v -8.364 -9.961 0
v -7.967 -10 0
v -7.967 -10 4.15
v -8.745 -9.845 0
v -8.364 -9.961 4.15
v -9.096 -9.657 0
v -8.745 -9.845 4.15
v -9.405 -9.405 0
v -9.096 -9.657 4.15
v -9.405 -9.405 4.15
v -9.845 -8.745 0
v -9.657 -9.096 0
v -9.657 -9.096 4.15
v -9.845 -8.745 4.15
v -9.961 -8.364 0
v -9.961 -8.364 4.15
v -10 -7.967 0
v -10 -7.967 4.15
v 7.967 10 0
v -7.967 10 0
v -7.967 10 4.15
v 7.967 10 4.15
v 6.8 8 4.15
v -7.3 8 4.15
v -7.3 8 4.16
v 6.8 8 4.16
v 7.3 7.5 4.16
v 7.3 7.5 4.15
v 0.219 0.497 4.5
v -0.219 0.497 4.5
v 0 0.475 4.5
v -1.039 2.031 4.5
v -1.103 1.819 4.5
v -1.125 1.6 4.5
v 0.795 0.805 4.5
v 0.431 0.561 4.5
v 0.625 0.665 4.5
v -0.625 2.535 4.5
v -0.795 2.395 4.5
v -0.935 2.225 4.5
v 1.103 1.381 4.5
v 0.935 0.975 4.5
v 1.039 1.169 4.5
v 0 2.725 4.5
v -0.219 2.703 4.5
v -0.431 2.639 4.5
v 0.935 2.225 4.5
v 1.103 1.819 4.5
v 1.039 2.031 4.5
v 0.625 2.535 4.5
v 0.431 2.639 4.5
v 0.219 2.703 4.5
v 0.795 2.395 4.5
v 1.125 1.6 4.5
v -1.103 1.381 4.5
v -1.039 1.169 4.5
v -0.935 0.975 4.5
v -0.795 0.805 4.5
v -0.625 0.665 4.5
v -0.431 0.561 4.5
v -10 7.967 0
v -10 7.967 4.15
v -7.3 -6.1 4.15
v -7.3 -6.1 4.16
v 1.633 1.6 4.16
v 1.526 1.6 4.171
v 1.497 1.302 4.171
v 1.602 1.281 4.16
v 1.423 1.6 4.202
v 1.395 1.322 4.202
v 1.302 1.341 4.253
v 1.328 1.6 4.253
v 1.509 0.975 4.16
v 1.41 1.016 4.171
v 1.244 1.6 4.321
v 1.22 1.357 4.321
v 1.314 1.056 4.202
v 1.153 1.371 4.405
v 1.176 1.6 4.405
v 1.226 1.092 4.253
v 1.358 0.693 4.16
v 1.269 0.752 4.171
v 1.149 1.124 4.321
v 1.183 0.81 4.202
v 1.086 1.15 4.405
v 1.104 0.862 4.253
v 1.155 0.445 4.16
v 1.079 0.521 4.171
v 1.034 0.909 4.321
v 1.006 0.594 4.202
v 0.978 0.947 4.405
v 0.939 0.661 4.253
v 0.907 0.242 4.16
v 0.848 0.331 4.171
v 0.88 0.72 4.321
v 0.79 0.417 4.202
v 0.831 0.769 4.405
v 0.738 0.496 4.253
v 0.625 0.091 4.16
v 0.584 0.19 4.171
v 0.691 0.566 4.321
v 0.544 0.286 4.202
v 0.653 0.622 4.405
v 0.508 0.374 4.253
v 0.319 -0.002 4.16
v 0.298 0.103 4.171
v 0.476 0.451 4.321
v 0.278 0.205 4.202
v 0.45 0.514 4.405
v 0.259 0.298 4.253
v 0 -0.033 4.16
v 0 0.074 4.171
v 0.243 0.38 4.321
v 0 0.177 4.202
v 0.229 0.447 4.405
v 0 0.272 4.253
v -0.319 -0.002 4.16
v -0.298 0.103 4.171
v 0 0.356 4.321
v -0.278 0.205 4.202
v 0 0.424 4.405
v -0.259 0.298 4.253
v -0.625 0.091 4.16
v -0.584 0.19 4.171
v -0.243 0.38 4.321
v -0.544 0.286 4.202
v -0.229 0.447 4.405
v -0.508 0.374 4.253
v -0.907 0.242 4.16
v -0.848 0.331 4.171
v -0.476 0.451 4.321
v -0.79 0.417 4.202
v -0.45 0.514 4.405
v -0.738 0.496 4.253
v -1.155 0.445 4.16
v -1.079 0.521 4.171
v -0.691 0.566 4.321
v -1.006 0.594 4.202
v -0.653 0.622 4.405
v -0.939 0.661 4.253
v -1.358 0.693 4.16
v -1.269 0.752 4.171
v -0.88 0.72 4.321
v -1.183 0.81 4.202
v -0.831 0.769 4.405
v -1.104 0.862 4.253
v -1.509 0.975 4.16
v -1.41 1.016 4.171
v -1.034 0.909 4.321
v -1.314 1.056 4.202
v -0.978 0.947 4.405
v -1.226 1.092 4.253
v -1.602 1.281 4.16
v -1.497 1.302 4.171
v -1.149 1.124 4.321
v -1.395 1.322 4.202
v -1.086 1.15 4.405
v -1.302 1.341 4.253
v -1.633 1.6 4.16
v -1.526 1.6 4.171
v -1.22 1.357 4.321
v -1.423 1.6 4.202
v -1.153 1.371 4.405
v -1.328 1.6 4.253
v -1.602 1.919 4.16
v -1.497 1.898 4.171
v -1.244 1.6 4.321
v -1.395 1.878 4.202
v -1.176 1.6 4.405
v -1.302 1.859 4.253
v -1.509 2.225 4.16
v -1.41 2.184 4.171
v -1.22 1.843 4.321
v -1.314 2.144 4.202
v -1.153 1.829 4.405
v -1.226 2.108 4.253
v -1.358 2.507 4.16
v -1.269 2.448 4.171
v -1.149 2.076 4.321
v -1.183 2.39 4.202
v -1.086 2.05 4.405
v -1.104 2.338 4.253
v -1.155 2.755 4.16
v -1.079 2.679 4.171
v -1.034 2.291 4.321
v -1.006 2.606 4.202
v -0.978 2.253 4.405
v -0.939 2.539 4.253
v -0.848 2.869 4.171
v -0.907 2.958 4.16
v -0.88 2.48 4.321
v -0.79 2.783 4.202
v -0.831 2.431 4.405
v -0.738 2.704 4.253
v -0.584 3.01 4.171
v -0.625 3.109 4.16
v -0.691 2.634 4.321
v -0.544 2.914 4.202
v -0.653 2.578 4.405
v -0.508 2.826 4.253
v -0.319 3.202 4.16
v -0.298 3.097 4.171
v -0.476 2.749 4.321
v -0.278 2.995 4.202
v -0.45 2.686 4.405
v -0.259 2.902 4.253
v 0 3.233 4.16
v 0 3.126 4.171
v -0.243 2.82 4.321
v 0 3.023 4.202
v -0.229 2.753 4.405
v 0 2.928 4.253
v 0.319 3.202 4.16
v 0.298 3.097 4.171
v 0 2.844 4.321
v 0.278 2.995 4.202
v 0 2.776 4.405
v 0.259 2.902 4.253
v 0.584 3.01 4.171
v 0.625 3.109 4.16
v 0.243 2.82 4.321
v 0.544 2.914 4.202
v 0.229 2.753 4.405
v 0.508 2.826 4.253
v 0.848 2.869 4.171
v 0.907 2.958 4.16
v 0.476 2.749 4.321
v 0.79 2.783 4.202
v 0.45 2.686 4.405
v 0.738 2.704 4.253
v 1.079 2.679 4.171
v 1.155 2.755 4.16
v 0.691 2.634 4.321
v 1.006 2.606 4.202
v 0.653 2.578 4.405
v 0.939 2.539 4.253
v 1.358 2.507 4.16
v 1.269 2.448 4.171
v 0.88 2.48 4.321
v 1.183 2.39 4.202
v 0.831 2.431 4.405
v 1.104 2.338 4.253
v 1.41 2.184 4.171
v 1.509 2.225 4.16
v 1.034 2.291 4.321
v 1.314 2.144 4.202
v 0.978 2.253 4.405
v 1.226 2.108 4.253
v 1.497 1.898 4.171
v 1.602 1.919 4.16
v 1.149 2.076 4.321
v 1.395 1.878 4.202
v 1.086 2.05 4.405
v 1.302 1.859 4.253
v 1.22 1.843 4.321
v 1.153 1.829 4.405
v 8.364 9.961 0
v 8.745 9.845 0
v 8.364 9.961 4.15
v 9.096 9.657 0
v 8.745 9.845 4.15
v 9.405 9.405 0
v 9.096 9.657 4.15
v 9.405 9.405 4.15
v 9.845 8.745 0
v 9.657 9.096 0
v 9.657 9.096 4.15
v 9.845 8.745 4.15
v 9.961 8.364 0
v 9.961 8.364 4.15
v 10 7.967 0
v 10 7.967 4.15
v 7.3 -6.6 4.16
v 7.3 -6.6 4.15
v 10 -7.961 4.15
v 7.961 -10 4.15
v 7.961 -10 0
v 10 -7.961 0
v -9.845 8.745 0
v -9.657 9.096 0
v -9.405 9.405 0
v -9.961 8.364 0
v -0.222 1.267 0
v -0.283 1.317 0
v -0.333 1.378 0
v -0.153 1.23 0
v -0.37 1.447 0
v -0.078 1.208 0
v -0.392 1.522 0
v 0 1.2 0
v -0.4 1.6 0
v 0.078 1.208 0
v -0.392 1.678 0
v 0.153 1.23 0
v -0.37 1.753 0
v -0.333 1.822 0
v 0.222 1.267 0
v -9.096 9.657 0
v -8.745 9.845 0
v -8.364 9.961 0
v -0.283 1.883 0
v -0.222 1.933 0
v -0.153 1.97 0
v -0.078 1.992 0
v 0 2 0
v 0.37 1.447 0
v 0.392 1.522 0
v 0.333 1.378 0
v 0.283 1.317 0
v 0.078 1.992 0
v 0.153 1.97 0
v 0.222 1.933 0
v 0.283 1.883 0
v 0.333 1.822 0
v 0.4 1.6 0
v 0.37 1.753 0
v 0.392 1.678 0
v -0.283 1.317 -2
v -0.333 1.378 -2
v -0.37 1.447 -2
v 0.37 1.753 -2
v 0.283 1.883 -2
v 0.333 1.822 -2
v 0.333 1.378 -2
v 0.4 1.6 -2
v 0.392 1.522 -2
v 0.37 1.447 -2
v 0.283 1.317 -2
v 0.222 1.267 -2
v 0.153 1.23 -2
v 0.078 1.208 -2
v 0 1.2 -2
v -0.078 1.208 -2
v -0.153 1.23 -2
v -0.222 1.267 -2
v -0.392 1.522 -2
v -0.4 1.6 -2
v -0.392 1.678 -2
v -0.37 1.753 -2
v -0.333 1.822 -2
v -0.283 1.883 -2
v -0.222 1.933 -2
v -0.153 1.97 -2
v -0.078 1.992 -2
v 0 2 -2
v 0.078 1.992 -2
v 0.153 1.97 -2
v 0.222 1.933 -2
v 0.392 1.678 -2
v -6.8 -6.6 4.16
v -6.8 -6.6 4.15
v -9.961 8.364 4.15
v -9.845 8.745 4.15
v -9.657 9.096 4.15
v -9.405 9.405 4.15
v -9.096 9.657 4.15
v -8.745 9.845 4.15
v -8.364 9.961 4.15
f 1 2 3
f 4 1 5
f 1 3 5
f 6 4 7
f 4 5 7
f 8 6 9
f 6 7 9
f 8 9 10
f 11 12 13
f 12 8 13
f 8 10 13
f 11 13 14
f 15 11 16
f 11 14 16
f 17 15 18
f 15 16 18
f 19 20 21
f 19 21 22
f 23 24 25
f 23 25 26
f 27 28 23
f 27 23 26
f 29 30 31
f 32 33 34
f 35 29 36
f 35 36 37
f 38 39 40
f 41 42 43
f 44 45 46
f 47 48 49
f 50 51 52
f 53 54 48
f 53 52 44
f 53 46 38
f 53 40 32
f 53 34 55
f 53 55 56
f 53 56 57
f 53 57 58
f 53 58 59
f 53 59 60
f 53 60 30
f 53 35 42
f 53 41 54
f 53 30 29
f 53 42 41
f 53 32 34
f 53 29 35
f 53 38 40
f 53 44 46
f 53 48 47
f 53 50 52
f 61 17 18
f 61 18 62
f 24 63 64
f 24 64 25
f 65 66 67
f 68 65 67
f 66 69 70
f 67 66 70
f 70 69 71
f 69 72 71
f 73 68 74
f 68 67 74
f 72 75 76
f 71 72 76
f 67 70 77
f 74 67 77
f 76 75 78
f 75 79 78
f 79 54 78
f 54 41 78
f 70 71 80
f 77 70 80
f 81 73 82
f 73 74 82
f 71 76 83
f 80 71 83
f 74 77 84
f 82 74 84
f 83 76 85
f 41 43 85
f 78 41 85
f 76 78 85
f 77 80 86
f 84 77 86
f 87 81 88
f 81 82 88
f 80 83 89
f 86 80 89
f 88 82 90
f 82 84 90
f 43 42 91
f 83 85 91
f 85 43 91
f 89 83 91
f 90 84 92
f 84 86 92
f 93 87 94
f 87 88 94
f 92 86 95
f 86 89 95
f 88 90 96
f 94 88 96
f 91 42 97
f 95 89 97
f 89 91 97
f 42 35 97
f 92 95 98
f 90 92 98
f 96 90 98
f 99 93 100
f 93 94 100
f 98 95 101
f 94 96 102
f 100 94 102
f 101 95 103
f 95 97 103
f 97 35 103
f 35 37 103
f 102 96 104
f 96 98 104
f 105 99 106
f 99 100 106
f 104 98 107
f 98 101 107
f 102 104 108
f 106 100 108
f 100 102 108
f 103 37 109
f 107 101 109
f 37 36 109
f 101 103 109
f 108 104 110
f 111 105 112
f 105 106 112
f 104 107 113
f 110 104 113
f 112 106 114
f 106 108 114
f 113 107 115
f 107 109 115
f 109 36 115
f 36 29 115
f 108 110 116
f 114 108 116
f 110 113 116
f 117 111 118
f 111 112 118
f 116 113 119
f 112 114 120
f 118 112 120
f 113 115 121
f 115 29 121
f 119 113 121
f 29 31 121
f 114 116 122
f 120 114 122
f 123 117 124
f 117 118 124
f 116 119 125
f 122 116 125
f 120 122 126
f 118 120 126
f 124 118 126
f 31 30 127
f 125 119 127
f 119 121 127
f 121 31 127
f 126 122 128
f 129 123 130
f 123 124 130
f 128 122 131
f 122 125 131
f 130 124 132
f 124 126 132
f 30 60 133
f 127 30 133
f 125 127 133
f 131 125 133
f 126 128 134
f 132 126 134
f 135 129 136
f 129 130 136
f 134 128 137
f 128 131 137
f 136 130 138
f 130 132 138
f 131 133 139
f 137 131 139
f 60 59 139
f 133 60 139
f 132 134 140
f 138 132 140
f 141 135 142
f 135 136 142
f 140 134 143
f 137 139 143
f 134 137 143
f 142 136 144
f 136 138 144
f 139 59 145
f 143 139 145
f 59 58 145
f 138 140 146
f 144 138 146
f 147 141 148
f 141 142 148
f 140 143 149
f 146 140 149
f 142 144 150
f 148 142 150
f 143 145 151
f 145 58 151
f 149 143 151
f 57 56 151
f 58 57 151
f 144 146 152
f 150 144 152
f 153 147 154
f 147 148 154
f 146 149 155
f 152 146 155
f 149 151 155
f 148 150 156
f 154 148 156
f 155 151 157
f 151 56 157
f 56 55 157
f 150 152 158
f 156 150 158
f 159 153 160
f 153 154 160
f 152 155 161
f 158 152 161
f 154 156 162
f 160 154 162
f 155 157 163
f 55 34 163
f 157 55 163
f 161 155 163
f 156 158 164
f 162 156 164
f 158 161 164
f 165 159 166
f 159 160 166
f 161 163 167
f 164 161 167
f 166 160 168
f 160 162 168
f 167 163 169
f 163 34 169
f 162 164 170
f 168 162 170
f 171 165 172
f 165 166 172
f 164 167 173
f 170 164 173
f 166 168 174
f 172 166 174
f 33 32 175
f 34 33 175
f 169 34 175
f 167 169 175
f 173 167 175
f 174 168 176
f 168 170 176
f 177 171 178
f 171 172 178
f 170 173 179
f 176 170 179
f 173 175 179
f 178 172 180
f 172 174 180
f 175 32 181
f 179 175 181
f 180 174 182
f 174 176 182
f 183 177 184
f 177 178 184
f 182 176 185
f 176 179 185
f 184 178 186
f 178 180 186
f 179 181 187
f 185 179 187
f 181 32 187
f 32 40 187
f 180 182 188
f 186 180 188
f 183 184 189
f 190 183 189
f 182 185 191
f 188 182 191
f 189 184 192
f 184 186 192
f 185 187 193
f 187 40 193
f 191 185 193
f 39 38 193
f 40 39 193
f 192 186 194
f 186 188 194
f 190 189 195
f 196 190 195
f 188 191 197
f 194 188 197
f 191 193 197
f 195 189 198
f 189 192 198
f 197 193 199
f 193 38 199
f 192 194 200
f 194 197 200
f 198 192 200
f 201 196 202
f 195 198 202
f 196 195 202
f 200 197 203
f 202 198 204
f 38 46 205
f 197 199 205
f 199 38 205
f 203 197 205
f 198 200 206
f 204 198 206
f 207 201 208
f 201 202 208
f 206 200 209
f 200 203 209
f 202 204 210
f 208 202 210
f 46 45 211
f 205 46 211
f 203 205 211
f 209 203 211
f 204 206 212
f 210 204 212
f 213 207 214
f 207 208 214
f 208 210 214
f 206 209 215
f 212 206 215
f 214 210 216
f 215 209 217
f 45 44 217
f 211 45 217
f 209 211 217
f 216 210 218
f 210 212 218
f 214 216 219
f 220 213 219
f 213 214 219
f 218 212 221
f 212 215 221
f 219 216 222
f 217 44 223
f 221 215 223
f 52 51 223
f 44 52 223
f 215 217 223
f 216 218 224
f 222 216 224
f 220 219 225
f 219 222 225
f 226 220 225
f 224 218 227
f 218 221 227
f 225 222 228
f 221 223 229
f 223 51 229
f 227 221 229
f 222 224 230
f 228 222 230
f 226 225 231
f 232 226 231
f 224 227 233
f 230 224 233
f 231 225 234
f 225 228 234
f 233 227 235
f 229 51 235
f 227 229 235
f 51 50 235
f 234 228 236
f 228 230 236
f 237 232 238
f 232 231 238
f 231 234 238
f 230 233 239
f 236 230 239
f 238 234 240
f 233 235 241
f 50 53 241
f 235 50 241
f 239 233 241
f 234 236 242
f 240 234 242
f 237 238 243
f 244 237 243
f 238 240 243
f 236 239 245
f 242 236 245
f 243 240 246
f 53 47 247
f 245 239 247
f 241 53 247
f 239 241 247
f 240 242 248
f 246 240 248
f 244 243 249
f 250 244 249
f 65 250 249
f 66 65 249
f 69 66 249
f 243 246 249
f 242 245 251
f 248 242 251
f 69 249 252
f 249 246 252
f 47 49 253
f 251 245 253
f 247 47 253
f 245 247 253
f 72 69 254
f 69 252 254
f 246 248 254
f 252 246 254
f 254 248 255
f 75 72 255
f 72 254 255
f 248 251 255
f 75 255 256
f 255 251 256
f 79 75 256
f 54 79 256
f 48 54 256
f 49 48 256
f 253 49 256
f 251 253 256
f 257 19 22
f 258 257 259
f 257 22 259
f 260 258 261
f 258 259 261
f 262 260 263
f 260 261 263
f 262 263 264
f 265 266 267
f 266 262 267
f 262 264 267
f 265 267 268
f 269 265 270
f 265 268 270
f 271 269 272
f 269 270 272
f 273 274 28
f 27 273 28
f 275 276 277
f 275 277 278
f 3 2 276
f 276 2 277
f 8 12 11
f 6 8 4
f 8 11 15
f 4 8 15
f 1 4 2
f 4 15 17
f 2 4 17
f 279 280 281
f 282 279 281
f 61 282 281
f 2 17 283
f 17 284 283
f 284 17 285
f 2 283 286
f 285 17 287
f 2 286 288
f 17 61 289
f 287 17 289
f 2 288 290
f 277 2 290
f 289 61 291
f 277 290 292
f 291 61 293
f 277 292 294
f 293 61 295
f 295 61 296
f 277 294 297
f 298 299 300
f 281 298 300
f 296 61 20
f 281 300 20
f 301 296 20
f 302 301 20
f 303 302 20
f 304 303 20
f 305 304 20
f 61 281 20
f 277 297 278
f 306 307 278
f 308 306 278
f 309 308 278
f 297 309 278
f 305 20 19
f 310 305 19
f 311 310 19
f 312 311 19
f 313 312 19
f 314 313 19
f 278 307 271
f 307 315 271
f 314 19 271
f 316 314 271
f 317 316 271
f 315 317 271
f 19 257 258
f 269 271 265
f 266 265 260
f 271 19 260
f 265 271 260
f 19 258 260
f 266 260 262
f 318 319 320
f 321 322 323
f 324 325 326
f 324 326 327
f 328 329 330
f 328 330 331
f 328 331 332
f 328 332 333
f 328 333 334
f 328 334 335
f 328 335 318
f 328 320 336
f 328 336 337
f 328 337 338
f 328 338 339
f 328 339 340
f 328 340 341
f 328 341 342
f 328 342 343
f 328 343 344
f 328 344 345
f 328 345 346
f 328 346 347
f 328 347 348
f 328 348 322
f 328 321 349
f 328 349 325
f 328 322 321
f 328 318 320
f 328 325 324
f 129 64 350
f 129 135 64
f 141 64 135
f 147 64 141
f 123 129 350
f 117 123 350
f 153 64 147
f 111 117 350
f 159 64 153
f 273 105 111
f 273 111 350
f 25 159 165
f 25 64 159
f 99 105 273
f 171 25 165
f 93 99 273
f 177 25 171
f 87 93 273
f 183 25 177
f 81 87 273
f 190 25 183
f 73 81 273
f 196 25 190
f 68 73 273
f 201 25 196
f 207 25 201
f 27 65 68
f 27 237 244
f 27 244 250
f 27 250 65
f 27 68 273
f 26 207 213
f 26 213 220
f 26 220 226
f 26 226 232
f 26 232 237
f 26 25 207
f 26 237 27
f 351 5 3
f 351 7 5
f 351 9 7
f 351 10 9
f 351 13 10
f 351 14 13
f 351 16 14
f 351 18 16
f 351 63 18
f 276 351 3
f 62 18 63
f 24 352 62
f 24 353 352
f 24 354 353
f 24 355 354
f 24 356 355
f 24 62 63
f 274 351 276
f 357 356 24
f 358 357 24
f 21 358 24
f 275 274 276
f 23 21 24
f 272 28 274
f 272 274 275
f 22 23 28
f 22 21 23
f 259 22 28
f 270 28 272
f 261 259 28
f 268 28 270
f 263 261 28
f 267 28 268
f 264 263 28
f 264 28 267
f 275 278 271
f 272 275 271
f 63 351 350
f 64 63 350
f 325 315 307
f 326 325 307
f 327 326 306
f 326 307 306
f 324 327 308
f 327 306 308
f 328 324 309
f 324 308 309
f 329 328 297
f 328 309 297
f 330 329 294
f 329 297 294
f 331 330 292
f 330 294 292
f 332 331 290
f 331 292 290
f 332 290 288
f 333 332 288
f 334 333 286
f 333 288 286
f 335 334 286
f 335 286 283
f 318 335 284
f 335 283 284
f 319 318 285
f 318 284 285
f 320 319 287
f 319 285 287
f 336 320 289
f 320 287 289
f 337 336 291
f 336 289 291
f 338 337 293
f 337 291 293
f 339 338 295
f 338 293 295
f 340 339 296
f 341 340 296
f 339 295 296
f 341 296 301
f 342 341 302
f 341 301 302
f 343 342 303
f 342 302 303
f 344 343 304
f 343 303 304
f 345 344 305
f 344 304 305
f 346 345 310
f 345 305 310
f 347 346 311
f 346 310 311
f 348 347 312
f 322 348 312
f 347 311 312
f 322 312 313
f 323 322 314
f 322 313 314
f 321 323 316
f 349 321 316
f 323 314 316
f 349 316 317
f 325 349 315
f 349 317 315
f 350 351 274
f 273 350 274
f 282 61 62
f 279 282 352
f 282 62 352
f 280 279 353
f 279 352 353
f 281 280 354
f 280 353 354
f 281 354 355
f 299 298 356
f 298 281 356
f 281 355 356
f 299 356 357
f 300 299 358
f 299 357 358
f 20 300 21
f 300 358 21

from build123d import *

# Parameters (mm, degrees)
SKETCH1_W           = 20
SKETCH1_H           = 20
BOSS_EXTRUDE1_DEPTH = 4.15
SKETCH4_R           = 1.125
BOSS_EXTRUDE3_DEPTH = 0.35
SKETCH5_W           = 14.6
SKETCH5_H           = 14.6
BOSS_EXTRUDE4_DEPTH = 0.01
FILLET1_R           = 0.55
CHAMFER1_SIZE       = 0.5
CUT_EXTRUDE1_DEPTH  = 15.73847007
SKETCH7_R           = 0.4
BOSS_EXTRUDE5_DEPTH = 2


with BuildPart() as part:
    # Sketch1 → Boss-Extrude1 (new body)
    with BuildSketch(Plane.XY):
        Rectangle(SKETCH1_W, SKETCH1_H)
    extrude(amount=BOSS_EXTRUDE1_DEPTH)

    # Sketch4 → Boss-Extrude3 (add)
    with BuildSketch(Plane.XY.offset(4.15)):
        with Locations((0, 1.6)):
            Circle(SKETCH4_R)
    extrude(amount=BOSS_EXTRUDE3_DEPTH)

    # Sketch5 → Boss-Extrude4 (add)
    with BuildSketch(Plane.XY.offset(4.15)):
        with Locations((0, 0.7)):
            Rectangle(SKETCH5_W, SKETCH5_H)
    extrude(amount=BOSS_EXTRUDE4_DEPTH)

    # Fillet1
    # the kernel refuses this fillet: 0.55 mm, written as the material it adds along each edge
    with BuildSketch(Plane(origin=(0, 1.6, 4.16), x_dir=(1, 0, 0), z_dir=(0, 1, 0))) as fillet1_piece_1:
        with BuildLine():
            CenterArc((1.633330601, -0.55), FILLET1_R, 90, 67.553649419)
            Line((1.125, -0.34), (1.114833388, -0.3358))
            ThreePointArc((1.114833388, -0.3358), (1.114, -0.17), (1.114, 0))
            Line((1.114, 0), (1.125, 0.011))
            Line((1.125, 0.011), (1.633330601, 0.011))
            Line((1.633330601, 0.011), (1.633330601, 0))
        make_face()
    revolve(axis=Axis((0, 1.6, 4.16), (0, 0, -1)))

    # Chamfer1
    chamfer1_edges = [part.edges().sort_by_distance(p)[0] for p in [
        (-7.3, -6.6, 4.155),
        (7.3, 8, 4.155),
    ]]
    chamfer(chamfer1_edges, length=CHAMFER1_SIZE)

    # Sketch6 → Cut-Extrude1 (cut, through all)
    with BuildSketch(Plane.XY.offset(4.15)):
        Polygon((7.960512242, -10), (10, -7.960512242), (10, -10), align=None)
        with BuildLine():
            Line((10, 7.966904756), (10, 10))
            Line((10, 10), (7.966904756, 10))
            ThreePointArc((7.966904756, 10), (9.40452019, 9.40452019), (10, 7.966904756))
        make_face()
        with BuildLine():
            Line((-7.966904756, 10), (-10, 10))
            Line((-10, 10), (-10, 7.966904756))
            ThreePointArc((-10, 7.966904756), (-9.40452019, 9.40452019), (-7.966904756, 10))
        make_face()
        with BuildLine():
            Line((-10, -7.966904756), (-10, -10))
            Line((-10, -10), (-7.966904756, -10))
            ThreePointArc((-7.966904756, -10), (-9.40452019, -9.40452019), (-10, -7.966904756))
        make_face()
    extrude(amount=-CUT_EXTRUDE1_DEPTH, mode=Mode.SUBTRACT)

    # Sketch7 → Boss-Extrude5 (add)
    with BuildSketch(Plane(origin=(0, 0, 0), x_dir=(-1, 0, 0), z_dir=(0, 0, -1))):
        with Locations(Location((0, 1.6, 0), (0, 0, 180))):
            Circle(SKETCH7_R)
    extrude(amount=BOSS_EXTRUDE5_DEPTH)


solid = part.part
